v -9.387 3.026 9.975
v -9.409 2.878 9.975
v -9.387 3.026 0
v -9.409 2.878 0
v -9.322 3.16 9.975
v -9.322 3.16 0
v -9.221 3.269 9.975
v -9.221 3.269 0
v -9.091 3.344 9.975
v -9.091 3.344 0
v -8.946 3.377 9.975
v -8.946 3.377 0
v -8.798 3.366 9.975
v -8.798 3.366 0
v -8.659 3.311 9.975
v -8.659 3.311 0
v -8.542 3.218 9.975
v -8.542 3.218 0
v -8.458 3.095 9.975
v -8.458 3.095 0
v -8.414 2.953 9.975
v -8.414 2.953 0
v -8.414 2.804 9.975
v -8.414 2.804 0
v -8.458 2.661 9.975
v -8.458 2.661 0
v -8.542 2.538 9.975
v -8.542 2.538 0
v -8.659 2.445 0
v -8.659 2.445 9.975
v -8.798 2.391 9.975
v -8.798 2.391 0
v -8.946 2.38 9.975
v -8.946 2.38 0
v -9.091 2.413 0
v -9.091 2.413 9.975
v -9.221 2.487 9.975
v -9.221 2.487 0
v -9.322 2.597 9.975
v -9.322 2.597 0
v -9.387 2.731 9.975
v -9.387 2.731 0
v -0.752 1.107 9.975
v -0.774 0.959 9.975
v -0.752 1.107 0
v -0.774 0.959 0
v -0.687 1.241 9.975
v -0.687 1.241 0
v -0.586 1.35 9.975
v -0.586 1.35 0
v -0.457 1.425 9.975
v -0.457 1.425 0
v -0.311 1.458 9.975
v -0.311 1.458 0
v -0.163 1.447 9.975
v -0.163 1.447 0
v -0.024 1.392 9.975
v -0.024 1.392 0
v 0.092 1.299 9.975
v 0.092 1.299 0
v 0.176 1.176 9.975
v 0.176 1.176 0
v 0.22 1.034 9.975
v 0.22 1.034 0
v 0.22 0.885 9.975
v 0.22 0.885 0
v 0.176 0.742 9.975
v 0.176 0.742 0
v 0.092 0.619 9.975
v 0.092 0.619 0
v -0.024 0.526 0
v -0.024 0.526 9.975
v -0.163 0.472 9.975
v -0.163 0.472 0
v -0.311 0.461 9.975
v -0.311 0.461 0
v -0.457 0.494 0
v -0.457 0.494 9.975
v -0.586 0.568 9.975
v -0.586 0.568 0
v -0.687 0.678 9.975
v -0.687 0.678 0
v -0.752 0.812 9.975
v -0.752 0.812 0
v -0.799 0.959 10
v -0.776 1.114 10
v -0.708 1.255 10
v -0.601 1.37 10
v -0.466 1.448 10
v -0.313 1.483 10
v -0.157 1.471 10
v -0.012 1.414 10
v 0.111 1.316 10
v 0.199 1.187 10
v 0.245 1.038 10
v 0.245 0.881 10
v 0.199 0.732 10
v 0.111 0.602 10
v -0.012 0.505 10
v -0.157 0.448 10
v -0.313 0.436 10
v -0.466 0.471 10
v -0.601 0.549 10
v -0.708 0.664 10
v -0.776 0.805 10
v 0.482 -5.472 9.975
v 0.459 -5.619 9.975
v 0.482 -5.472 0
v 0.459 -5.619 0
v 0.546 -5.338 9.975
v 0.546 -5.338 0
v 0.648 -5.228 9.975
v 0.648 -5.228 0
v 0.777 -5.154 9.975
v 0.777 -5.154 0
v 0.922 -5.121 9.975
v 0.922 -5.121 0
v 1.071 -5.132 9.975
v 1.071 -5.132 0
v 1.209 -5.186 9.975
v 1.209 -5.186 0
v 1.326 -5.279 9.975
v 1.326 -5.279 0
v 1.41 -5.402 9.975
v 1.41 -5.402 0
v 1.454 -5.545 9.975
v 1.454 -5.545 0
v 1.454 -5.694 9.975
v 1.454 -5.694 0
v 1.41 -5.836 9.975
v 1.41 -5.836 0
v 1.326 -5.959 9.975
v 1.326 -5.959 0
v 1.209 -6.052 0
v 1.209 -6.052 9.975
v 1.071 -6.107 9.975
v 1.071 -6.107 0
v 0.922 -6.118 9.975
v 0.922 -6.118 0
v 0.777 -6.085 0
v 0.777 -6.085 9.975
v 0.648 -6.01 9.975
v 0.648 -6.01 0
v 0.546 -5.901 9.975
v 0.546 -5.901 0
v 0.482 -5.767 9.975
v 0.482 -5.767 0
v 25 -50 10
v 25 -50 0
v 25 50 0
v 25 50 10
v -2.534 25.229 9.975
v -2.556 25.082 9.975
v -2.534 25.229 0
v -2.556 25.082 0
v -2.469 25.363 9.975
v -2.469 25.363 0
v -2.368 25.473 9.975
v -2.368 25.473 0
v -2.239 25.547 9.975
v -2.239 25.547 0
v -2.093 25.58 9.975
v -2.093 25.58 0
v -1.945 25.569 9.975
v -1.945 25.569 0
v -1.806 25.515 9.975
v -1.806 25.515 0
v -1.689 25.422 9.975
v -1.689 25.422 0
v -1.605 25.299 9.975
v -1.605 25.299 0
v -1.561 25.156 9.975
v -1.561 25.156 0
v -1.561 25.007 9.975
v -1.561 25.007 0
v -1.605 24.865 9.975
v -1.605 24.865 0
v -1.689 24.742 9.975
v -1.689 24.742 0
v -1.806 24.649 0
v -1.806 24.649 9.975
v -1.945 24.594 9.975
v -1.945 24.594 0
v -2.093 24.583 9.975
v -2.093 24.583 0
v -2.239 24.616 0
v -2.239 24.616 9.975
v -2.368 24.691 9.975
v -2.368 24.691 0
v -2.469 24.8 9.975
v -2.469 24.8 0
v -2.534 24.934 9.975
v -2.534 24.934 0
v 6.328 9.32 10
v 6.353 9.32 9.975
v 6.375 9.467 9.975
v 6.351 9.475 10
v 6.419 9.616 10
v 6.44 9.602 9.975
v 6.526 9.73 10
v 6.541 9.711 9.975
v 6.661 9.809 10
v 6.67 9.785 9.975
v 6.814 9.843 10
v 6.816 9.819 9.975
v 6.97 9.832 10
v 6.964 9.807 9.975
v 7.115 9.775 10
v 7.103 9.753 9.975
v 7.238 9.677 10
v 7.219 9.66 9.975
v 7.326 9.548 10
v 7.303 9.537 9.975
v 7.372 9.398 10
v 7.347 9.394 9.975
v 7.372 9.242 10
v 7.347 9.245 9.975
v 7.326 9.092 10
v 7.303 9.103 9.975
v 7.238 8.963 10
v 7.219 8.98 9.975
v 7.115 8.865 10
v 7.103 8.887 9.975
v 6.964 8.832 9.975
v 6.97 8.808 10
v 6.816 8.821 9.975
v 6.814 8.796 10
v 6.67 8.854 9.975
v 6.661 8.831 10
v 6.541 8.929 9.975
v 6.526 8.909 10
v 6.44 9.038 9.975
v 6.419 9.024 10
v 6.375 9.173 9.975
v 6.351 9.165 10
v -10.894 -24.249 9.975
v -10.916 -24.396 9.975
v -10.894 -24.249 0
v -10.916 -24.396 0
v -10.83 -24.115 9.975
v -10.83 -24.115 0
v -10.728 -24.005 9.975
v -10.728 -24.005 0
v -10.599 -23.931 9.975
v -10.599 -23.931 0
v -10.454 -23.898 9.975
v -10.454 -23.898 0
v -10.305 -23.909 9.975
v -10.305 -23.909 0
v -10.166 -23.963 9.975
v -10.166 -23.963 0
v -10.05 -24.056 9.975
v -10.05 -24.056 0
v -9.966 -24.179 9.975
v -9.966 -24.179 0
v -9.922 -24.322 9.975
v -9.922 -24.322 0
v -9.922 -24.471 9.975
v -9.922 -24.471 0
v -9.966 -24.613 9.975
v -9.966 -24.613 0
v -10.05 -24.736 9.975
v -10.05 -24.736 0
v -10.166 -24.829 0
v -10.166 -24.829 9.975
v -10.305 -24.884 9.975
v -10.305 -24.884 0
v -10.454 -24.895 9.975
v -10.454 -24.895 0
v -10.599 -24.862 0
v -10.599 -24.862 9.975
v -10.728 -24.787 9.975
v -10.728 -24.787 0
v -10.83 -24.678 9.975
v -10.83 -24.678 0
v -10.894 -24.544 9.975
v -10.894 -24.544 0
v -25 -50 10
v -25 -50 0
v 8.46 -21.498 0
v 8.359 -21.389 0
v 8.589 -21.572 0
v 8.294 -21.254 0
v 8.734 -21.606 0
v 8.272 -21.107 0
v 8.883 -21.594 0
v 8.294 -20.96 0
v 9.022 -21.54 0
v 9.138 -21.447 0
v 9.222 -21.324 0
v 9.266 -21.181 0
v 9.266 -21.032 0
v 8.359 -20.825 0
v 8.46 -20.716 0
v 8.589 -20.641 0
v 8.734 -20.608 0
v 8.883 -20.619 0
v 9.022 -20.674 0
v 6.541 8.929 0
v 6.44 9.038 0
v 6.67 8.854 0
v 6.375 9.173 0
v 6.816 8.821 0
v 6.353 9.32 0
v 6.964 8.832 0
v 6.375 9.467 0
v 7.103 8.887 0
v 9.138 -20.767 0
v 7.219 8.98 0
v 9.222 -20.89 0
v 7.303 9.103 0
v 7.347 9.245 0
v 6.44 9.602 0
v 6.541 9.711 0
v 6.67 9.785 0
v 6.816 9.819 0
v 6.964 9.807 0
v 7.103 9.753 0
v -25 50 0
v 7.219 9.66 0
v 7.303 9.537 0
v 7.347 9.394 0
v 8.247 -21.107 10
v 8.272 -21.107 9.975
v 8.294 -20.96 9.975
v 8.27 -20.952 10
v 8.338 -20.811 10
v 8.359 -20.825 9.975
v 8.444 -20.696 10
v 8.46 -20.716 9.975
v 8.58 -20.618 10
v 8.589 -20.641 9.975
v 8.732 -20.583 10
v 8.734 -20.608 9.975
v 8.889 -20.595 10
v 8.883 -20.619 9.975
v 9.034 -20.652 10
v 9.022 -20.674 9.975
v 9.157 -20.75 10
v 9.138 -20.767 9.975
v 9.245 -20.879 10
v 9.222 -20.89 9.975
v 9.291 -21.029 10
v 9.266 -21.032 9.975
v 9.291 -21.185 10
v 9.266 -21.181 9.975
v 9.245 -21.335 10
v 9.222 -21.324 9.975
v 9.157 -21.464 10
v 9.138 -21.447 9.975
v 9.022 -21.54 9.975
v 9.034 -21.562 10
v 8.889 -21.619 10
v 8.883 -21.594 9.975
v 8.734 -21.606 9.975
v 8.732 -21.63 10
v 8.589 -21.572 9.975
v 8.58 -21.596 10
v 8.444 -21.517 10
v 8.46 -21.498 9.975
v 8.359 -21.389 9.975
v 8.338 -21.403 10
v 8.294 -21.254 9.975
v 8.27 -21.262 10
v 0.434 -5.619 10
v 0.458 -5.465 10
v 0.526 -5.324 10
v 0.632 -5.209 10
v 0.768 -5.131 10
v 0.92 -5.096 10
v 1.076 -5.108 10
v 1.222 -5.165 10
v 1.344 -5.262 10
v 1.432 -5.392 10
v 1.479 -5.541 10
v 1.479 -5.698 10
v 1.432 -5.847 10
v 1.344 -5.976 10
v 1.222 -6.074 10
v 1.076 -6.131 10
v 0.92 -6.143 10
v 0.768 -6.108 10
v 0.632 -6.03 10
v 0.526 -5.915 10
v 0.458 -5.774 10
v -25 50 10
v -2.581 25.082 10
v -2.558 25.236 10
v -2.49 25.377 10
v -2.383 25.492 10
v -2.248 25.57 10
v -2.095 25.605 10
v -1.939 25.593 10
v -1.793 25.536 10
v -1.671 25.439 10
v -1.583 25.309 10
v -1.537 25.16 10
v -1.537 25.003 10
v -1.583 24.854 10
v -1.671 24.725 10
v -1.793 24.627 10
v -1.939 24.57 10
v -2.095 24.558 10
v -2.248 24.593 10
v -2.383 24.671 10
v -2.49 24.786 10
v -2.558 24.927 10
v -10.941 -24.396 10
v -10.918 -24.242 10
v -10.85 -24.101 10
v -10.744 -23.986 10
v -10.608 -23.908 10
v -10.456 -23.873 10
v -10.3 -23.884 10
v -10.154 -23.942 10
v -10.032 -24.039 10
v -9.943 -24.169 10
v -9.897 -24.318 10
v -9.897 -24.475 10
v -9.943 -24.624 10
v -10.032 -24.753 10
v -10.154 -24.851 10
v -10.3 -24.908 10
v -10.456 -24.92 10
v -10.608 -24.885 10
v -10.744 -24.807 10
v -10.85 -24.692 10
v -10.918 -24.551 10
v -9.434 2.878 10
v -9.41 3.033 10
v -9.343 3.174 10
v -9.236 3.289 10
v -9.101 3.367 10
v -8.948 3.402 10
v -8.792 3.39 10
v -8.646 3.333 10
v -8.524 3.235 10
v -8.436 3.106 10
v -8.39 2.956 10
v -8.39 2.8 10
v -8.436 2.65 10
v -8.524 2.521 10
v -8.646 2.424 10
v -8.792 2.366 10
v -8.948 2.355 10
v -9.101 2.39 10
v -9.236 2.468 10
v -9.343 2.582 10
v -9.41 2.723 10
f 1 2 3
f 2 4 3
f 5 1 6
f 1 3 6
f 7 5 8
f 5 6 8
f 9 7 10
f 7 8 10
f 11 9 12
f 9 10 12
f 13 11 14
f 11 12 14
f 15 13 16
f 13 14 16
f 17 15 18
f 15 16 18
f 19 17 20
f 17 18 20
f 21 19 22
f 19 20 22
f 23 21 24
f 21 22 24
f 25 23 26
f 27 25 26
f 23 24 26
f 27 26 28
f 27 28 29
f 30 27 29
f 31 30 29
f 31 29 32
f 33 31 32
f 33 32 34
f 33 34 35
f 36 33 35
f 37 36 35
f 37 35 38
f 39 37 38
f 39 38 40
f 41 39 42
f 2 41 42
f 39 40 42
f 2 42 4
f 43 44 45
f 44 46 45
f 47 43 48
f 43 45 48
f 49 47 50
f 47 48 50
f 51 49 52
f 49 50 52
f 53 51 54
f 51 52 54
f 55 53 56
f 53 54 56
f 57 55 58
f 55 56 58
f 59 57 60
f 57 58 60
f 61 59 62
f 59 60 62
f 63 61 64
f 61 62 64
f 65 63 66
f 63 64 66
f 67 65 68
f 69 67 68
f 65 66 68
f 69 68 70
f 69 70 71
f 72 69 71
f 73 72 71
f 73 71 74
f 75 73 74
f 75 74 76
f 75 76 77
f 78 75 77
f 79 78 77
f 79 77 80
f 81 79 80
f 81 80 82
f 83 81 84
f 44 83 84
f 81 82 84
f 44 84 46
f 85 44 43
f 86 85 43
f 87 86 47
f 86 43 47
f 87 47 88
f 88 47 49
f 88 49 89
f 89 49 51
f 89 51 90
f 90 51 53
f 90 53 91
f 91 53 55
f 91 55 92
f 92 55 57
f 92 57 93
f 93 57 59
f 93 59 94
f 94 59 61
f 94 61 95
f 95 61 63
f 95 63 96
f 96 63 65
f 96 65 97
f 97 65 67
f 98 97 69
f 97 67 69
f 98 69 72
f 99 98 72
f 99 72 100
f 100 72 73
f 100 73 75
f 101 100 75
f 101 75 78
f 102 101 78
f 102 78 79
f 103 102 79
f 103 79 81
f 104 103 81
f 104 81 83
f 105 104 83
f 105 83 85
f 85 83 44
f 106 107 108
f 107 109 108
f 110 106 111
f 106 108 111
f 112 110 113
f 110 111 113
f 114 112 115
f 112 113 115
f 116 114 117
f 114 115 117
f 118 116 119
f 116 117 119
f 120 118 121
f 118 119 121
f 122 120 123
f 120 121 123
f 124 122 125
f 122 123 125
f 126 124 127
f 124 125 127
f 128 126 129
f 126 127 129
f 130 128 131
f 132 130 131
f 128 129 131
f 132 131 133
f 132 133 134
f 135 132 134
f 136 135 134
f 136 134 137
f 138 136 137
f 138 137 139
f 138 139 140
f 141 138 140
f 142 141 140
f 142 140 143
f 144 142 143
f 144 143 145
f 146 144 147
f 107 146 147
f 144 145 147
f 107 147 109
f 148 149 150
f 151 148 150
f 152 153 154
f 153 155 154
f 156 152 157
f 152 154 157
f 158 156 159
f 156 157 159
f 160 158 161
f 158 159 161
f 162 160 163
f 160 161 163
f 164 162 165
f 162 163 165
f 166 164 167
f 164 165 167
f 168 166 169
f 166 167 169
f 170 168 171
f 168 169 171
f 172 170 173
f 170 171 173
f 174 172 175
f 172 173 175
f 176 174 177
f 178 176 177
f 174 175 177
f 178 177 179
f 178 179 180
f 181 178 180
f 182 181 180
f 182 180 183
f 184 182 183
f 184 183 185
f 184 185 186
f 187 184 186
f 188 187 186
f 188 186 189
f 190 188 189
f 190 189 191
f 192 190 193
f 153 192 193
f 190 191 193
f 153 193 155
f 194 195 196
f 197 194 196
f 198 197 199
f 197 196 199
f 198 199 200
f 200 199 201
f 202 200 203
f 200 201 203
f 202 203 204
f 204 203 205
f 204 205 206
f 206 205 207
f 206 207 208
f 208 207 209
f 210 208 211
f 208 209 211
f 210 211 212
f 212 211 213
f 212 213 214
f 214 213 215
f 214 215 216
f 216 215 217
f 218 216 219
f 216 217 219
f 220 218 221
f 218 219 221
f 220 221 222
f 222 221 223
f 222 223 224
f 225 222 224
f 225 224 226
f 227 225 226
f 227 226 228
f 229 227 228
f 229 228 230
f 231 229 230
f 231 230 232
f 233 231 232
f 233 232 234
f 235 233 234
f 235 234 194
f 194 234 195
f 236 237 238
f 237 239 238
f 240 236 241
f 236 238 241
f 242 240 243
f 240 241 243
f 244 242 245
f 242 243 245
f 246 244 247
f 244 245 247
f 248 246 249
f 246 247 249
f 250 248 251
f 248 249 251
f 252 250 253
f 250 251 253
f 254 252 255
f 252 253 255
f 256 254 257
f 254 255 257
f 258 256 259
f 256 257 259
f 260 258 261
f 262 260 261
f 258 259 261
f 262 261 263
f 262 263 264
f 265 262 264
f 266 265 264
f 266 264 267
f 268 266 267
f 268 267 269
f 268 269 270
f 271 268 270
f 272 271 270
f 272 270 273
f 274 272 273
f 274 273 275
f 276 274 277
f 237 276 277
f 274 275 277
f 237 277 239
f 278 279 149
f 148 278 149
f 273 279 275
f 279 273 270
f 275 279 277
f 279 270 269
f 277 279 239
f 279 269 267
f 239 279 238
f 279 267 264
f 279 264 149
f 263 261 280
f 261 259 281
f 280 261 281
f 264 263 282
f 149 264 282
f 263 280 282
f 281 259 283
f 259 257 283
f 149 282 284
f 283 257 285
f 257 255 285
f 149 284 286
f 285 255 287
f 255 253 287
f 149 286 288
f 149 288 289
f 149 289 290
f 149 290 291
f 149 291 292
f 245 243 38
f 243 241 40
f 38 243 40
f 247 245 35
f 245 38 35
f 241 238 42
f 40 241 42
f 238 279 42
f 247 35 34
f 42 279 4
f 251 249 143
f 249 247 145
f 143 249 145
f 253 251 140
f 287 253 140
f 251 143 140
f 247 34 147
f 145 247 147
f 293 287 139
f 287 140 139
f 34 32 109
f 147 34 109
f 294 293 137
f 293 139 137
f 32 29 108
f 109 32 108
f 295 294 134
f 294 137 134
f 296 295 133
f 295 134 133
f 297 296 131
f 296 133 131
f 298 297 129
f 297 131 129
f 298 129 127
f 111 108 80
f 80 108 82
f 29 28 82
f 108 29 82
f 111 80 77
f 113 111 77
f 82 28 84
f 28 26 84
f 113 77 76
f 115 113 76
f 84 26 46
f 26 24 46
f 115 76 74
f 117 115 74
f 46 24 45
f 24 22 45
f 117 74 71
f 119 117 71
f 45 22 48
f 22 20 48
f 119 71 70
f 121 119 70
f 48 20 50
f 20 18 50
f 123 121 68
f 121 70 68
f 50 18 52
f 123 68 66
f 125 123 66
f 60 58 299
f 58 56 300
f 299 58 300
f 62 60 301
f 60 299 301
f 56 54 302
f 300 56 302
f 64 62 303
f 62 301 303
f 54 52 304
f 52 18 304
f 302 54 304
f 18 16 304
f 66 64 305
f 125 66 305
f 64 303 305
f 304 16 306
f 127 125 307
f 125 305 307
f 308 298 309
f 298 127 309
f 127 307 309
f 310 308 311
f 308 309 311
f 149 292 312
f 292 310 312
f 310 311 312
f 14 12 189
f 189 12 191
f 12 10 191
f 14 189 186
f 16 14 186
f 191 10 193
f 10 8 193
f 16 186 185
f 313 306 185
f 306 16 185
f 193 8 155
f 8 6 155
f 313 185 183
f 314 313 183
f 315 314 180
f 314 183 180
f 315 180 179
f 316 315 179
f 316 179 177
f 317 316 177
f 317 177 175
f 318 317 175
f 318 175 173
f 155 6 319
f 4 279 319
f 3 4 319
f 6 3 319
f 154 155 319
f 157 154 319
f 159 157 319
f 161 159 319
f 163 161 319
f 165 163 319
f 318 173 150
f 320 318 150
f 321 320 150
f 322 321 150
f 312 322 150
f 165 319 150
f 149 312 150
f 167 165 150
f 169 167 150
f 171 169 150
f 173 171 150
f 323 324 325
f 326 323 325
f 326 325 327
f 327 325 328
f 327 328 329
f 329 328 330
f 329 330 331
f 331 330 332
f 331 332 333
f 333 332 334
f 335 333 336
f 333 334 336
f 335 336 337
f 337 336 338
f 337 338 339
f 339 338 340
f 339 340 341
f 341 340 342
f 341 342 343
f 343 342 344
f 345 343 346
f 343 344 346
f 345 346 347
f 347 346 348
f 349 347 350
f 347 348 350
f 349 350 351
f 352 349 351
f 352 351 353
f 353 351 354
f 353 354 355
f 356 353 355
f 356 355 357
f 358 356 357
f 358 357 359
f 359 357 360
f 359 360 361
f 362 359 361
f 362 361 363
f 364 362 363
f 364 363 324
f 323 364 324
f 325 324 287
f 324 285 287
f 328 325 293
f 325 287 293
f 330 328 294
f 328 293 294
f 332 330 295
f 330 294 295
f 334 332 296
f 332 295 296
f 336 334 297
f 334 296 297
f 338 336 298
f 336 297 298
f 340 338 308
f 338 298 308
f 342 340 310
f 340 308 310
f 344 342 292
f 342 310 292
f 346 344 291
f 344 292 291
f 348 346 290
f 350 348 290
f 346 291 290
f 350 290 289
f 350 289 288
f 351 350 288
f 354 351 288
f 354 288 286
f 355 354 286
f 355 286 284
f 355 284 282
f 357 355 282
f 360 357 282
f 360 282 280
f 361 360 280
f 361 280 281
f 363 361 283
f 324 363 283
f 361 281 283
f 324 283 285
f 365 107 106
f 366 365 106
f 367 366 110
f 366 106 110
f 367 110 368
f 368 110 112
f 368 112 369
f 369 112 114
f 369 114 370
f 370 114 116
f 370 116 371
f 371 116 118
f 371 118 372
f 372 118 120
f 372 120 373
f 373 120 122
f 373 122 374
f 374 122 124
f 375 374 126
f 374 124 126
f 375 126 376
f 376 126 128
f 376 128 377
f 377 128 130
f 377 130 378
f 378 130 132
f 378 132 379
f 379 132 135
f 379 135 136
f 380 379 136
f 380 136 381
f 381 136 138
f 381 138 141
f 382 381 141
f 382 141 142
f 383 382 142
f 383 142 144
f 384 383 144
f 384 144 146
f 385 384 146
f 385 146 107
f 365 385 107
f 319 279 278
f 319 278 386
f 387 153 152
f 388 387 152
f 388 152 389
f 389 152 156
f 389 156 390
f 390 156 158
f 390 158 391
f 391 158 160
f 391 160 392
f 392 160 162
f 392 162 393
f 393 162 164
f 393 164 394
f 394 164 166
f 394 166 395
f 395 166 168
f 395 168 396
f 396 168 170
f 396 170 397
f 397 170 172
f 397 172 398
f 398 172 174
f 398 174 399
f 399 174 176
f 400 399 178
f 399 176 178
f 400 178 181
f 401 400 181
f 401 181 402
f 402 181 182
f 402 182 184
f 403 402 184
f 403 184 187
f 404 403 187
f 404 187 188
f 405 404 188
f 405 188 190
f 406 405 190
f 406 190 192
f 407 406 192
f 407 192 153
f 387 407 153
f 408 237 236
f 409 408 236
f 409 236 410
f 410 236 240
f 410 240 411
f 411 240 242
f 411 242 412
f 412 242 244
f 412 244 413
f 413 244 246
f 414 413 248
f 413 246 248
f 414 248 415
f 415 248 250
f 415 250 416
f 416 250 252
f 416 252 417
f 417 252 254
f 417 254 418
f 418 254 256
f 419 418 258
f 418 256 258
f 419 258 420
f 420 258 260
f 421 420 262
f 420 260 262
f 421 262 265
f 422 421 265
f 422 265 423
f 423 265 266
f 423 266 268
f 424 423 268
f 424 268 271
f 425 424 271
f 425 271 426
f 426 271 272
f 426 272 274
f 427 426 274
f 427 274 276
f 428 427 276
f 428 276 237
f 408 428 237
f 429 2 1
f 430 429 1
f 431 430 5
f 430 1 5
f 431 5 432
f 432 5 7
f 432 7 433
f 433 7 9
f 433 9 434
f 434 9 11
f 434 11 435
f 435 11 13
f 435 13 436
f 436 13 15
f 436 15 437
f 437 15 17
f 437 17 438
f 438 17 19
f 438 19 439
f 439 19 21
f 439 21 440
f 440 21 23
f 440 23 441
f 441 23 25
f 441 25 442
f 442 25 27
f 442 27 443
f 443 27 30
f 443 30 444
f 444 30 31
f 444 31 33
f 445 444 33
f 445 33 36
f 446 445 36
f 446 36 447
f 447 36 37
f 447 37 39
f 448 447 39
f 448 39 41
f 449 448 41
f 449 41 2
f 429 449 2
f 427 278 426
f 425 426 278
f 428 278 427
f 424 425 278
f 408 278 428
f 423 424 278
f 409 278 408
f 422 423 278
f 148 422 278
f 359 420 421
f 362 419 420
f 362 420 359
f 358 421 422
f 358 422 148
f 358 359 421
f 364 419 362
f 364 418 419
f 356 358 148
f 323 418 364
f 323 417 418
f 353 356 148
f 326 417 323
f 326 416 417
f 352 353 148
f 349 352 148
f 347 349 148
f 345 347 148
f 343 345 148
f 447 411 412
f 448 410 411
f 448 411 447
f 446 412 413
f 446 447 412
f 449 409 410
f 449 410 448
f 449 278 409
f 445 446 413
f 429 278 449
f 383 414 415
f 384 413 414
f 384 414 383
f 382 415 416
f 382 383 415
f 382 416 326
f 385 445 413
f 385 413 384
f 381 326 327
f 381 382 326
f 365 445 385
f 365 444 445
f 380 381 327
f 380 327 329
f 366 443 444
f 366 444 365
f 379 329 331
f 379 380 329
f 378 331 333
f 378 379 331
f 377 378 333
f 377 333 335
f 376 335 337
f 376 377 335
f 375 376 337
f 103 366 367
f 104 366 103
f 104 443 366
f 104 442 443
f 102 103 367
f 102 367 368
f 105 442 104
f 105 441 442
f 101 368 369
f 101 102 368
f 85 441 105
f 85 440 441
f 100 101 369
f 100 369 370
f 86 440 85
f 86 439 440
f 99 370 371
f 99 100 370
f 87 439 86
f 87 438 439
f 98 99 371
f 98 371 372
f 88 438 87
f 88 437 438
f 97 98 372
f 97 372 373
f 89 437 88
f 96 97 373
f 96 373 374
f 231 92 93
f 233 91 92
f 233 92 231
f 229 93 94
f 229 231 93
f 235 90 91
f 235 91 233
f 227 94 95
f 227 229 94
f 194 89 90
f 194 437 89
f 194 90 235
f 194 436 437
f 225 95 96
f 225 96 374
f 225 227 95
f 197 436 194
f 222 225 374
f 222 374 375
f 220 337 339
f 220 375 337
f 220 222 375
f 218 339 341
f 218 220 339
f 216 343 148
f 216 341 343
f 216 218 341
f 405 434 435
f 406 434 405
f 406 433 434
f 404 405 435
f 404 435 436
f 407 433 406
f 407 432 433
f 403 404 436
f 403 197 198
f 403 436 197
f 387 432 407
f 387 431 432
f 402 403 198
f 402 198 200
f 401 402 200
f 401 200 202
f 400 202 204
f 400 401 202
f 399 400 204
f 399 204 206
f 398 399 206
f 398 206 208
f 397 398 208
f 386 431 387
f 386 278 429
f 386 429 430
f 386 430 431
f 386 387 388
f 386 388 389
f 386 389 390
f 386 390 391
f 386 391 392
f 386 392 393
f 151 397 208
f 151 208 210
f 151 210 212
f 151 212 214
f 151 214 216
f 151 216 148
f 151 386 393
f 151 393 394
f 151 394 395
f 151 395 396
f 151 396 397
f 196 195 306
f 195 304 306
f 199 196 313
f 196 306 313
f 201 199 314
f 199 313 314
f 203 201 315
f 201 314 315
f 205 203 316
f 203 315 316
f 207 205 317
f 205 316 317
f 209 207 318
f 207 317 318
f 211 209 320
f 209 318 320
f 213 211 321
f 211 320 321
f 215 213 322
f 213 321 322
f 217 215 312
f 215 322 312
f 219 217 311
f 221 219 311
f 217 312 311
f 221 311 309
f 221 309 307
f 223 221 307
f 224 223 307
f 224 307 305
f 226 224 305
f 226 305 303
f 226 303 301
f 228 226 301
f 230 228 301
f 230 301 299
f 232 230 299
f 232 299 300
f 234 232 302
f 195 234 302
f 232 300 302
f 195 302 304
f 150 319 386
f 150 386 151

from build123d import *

# Parameters (mm, degrees)
SKETCH1_W                          = 50
SKETCH1_H                          = 100
BOSS_EXTRUDE1_DEPTH                = 10
F_1_0_1_DIAMETER_HOLE1_D           = 1
F_1_0_1_DIAMETER_HOLE1_CSINK_D     = 1.05
F_1_0_1_DIAMETER_HOLE1_CSINK_ANGLE = 90


with BuildPart() as part:
    # Sketch1 → Boss-Extrude1 (new body)
    with BuildSketch(Plane.XY):
        Rectangle(SKETCH1_W, SKETCH1_H)
    extrude(amount=BOSS_EXTRUDE1_DEPTH)

    # Ø1.0 (1) Diameter Hole1 (through all)
    with Locations(Plane(origin=(-10.416398975, -24.396302864, 10), x_dir=(1, 0, 0), z_dir=(0, 0, 1))):
        with Locations((0, 0), (10.142283212, 25.355708033), (11.375804144, 18.776929732), (1.507636693, 27.27451837), (17.269293038, 33.716238789), (8.360530756, 49.477895134), (19.188103375, 3.289389151)):
            CounterSinkHole(F_1_0_1_DIAMETER_HOLE1_D / 2, F_1_0_1_DIAMETER_HOLE1_CSINK_D / 2, counter_sink_angle=F_1_0_1_DIAMETER_HOLE1_CSINK_ANGLE)


solid = part.part
